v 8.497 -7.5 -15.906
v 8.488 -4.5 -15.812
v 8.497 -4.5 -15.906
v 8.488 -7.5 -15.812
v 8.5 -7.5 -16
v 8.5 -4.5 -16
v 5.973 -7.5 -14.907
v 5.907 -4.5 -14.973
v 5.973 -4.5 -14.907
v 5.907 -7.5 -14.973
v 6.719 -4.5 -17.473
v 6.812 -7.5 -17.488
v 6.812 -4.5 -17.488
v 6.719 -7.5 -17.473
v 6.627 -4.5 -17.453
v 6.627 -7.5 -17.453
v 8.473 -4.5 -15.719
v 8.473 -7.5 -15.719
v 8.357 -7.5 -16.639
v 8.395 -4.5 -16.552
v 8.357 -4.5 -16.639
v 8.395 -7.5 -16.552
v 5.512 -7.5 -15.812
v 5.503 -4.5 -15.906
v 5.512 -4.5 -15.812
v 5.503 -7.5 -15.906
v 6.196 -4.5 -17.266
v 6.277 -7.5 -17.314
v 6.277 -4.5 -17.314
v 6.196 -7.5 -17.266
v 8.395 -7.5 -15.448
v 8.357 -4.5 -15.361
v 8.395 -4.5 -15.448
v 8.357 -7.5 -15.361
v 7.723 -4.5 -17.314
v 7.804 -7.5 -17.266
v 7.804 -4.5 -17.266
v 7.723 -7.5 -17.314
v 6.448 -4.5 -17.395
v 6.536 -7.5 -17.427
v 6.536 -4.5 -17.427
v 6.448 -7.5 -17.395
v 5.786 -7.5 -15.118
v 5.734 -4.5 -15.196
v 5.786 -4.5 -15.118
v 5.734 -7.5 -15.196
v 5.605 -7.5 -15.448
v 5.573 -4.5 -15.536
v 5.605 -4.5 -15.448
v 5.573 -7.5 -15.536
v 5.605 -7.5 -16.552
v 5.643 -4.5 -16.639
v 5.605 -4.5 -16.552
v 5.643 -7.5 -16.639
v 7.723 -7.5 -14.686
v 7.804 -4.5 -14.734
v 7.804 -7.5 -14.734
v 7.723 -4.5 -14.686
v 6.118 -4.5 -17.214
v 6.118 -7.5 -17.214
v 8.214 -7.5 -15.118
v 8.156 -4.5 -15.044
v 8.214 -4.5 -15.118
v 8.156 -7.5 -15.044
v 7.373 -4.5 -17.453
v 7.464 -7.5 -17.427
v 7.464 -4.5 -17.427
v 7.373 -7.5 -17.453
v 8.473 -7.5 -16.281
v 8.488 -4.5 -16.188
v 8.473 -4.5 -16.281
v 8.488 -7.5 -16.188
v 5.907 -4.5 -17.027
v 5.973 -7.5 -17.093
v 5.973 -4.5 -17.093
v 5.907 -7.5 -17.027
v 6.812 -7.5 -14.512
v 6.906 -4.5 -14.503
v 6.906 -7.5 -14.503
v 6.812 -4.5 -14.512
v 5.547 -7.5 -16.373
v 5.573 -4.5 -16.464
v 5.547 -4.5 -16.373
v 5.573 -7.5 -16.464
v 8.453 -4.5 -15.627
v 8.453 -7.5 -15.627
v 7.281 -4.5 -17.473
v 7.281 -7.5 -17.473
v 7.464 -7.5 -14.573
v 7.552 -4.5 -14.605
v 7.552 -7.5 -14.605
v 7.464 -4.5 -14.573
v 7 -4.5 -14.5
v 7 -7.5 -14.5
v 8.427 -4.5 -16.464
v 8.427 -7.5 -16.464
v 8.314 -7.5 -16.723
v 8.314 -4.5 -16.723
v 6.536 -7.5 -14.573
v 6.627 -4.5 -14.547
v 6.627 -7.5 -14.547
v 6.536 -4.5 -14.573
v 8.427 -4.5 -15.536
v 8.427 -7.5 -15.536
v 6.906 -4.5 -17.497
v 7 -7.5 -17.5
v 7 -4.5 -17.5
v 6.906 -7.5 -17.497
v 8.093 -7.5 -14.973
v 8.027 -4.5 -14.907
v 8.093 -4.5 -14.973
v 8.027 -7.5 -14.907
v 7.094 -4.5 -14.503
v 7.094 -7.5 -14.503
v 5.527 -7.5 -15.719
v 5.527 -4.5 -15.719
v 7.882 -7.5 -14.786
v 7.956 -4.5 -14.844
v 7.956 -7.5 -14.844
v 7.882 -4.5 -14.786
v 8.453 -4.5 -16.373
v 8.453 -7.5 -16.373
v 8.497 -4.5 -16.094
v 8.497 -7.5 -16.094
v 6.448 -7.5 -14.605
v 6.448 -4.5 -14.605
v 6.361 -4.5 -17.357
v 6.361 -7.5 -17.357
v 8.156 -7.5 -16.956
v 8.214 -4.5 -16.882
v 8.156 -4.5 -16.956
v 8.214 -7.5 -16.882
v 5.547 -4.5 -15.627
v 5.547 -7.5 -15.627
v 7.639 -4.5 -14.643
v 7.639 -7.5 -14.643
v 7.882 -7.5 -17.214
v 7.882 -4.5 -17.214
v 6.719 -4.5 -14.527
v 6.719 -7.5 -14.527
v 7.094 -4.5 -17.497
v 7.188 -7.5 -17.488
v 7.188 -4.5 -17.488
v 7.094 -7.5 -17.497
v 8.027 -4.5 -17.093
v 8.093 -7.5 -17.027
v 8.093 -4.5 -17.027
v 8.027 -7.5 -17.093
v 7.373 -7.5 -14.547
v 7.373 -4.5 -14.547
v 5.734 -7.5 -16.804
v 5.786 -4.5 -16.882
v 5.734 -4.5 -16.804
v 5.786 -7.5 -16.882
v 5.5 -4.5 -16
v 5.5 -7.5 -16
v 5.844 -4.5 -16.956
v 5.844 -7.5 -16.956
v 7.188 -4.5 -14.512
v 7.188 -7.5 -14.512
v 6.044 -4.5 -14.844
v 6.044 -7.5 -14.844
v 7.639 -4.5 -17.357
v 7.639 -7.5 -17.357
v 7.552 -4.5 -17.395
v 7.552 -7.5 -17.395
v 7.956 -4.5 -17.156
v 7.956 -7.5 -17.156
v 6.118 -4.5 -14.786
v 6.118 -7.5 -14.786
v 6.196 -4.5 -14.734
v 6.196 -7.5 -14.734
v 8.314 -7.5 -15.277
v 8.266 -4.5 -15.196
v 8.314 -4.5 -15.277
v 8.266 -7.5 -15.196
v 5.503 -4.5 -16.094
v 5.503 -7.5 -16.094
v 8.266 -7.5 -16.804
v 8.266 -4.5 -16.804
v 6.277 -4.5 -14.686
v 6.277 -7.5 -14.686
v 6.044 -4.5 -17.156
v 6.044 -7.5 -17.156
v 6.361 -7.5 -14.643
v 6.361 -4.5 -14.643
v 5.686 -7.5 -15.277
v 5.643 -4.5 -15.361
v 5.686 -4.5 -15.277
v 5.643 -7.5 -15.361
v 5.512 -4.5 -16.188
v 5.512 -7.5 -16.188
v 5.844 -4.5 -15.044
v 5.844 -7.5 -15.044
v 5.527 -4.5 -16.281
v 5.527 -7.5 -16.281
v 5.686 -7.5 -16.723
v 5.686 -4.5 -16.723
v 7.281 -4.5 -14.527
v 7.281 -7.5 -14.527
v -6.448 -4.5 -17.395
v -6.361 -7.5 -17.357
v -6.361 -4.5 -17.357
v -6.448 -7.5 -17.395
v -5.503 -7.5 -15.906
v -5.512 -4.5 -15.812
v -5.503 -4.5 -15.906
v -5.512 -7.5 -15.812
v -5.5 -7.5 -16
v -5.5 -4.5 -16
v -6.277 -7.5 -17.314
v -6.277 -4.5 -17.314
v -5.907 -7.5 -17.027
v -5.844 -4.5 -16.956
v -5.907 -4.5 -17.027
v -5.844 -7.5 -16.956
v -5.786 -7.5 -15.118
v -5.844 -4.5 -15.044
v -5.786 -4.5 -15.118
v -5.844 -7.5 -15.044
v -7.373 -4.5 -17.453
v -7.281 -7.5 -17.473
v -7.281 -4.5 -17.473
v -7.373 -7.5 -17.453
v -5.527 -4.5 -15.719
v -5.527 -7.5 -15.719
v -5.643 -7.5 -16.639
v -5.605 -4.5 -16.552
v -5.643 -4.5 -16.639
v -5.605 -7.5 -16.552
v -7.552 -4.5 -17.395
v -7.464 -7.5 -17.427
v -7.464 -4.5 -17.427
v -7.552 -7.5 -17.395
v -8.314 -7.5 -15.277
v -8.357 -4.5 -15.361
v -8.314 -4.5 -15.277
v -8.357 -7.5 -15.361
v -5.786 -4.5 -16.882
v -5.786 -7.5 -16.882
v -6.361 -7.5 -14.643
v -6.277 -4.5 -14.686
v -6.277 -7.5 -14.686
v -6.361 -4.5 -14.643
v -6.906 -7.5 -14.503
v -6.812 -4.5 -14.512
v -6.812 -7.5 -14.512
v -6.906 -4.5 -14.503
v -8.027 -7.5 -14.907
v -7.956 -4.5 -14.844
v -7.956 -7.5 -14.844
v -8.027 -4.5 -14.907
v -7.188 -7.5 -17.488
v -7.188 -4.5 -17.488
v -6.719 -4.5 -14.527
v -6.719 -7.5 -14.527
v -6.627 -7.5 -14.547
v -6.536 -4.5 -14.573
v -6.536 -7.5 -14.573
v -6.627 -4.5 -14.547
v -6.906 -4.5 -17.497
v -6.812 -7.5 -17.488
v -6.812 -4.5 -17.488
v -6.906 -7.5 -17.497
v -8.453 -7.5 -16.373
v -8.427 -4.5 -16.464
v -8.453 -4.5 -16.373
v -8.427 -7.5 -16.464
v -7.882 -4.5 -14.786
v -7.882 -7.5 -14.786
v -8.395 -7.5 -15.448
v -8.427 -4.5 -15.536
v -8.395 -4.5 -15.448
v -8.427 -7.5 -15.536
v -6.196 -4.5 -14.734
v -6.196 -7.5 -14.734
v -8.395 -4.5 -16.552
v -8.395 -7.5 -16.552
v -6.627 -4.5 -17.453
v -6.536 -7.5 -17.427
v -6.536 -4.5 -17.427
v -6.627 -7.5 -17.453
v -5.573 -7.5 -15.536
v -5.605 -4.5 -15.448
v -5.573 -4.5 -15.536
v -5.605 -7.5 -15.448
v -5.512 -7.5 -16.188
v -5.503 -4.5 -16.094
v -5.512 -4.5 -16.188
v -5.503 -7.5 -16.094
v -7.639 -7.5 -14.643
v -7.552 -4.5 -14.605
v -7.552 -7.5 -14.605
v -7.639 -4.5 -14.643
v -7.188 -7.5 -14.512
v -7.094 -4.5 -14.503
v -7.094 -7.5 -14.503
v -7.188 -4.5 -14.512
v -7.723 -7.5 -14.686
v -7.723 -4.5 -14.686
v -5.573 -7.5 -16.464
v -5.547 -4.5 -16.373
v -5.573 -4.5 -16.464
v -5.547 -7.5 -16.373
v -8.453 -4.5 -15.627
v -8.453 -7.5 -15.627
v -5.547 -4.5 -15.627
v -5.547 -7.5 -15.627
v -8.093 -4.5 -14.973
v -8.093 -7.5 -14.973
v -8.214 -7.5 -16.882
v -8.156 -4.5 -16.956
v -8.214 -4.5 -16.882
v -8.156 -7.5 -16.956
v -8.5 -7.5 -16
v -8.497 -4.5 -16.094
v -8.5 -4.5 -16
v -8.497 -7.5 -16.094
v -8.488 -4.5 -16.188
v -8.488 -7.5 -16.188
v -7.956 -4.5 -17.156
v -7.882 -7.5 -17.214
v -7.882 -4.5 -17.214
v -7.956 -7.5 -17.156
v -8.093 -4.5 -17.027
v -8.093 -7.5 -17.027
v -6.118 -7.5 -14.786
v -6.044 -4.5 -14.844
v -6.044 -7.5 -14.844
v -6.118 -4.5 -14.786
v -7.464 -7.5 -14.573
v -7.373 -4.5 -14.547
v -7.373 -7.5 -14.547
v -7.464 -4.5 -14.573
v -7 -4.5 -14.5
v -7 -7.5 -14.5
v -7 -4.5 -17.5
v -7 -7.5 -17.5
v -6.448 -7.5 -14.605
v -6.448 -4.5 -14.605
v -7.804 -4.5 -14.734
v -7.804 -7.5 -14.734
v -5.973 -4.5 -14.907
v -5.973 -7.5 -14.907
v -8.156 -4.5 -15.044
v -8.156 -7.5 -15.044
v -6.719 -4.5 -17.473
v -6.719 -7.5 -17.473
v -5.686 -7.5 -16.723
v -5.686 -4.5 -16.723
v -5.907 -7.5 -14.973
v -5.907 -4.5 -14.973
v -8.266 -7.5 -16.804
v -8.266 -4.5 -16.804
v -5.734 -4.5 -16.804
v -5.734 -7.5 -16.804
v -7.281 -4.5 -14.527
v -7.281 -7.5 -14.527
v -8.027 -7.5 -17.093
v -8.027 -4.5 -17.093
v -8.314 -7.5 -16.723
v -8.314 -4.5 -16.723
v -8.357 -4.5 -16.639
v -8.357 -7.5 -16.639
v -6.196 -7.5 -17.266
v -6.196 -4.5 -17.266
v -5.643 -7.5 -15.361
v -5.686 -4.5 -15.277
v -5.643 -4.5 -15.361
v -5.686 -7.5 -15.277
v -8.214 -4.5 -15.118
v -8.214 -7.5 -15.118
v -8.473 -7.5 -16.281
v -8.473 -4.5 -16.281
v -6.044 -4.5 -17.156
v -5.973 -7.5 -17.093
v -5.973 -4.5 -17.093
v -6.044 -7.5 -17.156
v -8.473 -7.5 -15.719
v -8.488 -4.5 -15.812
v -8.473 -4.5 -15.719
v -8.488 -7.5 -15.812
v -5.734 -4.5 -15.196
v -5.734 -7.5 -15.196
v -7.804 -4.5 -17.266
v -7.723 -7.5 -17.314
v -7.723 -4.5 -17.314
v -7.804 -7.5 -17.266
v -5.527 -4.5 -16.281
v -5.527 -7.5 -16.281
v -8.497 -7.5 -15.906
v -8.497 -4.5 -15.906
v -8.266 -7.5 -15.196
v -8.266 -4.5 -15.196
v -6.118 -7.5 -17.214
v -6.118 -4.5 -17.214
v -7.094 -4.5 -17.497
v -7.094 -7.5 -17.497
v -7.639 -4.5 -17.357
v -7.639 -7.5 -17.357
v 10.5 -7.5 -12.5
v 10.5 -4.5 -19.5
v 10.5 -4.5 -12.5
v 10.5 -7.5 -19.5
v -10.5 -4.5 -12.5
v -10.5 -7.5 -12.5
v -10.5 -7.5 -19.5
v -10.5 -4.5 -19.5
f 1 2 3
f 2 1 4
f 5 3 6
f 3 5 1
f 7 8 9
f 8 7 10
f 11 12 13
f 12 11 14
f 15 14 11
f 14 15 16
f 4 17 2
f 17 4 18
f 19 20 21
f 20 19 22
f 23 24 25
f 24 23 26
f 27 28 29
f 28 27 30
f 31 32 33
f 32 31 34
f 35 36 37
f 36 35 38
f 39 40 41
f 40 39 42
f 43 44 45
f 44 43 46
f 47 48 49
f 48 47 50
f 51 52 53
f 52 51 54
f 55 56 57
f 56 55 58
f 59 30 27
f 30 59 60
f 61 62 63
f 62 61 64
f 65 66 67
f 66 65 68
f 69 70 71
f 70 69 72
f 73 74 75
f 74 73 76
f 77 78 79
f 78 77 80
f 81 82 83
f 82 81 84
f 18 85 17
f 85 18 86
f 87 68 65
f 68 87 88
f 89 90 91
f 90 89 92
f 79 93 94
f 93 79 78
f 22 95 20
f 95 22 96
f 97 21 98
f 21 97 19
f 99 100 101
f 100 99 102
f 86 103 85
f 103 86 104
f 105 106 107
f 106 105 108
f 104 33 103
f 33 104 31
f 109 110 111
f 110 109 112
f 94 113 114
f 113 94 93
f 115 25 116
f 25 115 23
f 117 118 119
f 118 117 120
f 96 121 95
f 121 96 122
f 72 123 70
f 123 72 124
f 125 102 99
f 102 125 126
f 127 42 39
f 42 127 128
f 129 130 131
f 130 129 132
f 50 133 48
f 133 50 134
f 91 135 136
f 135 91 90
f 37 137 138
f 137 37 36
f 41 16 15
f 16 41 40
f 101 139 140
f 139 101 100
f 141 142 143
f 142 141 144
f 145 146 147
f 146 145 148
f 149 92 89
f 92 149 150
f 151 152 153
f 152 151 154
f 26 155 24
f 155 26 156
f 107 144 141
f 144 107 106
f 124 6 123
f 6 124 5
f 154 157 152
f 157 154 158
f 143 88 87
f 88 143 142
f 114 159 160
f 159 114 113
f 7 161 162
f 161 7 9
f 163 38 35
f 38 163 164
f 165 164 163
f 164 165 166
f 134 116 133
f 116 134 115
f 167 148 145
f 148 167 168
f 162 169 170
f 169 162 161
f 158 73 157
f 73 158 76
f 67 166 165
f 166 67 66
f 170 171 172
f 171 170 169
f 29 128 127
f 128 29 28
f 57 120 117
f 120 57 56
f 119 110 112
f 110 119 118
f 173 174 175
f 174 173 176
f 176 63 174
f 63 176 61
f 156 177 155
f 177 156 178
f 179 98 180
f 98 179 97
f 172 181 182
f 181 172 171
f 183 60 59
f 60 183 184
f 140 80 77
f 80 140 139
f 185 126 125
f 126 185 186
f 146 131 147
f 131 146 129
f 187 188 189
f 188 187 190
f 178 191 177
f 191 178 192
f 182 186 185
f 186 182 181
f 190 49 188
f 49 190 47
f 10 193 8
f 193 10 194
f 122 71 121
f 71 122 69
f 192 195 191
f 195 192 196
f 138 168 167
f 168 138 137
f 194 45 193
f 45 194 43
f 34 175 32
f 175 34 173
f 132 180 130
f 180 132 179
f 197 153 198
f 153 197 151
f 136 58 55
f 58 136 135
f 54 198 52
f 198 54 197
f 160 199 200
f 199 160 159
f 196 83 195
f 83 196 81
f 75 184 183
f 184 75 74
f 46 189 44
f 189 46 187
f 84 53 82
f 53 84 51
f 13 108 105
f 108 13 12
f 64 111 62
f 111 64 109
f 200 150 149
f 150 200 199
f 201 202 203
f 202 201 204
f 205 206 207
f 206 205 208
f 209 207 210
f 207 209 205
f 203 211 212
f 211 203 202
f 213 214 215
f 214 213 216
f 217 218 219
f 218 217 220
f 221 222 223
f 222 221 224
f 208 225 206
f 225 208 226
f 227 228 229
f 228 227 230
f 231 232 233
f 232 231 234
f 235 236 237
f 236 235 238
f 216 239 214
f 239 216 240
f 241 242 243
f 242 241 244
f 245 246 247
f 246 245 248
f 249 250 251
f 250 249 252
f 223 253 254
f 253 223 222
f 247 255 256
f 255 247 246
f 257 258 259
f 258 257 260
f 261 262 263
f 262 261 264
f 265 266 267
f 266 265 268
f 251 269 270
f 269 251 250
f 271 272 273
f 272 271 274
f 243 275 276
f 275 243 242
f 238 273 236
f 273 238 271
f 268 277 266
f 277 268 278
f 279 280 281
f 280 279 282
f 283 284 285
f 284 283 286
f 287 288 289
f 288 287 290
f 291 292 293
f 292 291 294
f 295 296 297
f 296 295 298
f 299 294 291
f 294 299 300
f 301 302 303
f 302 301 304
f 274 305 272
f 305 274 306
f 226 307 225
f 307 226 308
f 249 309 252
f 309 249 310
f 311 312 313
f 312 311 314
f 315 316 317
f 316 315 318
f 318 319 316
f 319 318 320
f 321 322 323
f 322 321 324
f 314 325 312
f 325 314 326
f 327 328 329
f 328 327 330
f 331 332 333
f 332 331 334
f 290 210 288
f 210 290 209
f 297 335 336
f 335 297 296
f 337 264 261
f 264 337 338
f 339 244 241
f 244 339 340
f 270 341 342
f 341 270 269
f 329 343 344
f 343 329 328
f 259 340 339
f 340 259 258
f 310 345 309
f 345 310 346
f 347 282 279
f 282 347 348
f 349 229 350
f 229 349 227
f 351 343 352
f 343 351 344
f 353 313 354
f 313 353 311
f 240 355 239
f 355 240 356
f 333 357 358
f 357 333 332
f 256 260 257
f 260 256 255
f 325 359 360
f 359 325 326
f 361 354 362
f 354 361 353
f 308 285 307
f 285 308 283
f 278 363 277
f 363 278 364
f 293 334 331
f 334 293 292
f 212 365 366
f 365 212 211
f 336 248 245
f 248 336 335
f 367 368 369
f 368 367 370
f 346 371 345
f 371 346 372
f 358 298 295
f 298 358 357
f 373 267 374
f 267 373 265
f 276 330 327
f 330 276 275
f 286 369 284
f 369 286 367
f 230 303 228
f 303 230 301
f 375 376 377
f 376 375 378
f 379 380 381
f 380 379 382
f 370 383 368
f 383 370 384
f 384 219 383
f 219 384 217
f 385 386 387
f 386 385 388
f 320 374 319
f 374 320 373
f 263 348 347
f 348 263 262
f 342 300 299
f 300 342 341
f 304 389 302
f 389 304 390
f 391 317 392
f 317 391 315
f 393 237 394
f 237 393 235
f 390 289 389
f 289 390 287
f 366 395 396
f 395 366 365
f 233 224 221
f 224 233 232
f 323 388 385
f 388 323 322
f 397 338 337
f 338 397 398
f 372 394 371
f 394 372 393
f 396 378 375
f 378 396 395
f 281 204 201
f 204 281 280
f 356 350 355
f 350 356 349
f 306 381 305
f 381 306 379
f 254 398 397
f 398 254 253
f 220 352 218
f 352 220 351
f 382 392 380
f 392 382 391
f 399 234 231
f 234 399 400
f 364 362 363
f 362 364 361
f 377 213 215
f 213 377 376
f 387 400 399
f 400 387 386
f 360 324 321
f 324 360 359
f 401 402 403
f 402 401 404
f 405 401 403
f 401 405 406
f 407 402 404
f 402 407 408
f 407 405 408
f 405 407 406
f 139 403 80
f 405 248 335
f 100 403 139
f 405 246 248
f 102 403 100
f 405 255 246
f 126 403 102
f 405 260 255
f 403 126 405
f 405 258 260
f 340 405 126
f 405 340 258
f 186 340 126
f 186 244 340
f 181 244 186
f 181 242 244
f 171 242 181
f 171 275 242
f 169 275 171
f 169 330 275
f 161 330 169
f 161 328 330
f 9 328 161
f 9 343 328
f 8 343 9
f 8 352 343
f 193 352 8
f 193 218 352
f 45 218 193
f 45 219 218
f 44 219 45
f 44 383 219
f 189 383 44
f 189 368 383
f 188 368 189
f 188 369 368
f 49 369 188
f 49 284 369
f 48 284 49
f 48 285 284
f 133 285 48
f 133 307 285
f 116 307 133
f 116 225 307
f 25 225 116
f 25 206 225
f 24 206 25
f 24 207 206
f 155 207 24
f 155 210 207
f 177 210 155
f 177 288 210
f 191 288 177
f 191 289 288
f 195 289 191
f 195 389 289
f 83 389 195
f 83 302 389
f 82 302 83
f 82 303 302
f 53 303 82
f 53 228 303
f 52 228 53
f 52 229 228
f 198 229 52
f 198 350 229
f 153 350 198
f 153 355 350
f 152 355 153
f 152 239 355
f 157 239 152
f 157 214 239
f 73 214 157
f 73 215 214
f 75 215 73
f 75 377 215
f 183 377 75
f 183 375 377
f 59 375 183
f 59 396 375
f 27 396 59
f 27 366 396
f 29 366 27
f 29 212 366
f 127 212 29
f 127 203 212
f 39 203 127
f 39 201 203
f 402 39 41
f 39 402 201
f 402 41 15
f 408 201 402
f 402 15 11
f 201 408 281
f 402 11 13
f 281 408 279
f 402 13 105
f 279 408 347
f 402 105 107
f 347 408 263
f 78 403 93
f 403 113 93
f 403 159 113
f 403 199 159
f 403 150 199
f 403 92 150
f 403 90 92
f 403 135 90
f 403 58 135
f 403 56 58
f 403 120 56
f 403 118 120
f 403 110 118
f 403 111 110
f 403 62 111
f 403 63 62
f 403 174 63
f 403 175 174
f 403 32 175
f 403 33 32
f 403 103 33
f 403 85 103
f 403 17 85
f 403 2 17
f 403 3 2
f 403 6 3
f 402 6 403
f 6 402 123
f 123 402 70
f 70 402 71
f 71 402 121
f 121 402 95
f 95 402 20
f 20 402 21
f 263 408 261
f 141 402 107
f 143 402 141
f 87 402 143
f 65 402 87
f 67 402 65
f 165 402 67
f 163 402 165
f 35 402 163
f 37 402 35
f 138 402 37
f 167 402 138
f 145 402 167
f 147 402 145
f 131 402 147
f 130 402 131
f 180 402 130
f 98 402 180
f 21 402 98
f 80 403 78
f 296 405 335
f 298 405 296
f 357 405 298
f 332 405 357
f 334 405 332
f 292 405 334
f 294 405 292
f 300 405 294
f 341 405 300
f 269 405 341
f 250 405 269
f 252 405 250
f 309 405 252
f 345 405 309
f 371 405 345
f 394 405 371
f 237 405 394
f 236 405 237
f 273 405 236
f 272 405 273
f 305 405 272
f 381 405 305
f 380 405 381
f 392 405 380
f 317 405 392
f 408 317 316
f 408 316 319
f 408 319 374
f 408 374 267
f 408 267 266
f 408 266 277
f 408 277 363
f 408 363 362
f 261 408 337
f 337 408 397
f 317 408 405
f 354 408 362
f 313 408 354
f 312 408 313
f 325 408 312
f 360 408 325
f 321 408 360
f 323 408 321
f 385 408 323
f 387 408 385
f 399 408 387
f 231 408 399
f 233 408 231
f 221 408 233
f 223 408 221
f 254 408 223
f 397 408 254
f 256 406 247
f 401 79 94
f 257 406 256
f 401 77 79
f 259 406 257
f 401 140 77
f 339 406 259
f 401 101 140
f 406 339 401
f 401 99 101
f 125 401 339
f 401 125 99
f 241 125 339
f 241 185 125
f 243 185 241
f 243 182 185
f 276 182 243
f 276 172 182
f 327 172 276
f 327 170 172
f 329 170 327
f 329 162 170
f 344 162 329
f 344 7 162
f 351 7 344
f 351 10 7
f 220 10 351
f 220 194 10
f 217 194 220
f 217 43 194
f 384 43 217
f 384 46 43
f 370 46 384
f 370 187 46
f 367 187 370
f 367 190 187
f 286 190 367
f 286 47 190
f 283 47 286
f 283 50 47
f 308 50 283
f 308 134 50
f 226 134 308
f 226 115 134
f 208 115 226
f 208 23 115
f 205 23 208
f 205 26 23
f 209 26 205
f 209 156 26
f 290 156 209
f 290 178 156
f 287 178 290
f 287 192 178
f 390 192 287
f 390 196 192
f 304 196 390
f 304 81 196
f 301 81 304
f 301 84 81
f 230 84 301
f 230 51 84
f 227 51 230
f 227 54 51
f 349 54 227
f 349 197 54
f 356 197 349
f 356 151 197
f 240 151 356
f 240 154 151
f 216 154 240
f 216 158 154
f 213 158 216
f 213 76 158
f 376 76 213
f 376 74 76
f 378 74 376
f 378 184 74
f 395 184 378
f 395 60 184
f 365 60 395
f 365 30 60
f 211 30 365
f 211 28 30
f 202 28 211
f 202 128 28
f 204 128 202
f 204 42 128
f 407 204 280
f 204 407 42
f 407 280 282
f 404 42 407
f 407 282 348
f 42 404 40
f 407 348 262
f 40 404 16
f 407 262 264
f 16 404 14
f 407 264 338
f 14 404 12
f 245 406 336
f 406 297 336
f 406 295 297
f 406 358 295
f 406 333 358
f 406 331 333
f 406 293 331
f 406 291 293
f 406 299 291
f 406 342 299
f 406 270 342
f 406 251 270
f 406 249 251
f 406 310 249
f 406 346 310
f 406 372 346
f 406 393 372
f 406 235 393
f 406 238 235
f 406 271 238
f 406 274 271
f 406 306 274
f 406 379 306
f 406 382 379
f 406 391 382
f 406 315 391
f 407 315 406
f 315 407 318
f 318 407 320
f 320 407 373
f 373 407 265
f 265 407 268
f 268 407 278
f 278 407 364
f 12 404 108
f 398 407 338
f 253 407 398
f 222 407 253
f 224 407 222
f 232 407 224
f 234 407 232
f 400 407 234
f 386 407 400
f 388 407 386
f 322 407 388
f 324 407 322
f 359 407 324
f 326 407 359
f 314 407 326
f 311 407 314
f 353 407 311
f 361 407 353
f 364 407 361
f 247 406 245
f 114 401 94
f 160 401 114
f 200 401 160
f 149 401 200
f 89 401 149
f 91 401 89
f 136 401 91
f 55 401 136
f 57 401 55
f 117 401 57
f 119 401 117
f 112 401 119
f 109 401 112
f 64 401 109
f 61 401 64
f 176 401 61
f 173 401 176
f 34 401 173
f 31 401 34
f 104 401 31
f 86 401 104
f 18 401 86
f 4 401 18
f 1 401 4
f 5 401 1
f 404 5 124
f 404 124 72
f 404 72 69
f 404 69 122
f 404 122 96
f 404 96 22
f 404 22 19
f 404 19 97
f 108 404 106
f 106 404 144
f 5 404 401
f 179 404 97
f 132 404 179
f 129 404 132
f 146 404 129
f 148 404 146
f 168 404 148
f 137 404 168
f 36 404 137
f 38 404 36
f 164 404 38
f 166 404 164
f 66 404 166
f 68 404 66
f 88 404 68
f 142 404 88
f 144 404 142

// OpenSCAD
difference(){
	union(){

        translate([-10.5,-7.5,-33/2-3]){
            cube([21,3,7], center=false);
        }
     


	}
	union() {
        translate([7,20,-16]){
            rotate([90,0,0]){
                color("blue")
                cylinder(h=100, r=1.5, $fn=100, center=false);
            }
        }
        translate([-7,20,-16]){
            rotate([90,0,0]){
                color("blue")
                cylinder(h=100, r=1.5, $fn=100, center=false);
            }
        }

	}
}
